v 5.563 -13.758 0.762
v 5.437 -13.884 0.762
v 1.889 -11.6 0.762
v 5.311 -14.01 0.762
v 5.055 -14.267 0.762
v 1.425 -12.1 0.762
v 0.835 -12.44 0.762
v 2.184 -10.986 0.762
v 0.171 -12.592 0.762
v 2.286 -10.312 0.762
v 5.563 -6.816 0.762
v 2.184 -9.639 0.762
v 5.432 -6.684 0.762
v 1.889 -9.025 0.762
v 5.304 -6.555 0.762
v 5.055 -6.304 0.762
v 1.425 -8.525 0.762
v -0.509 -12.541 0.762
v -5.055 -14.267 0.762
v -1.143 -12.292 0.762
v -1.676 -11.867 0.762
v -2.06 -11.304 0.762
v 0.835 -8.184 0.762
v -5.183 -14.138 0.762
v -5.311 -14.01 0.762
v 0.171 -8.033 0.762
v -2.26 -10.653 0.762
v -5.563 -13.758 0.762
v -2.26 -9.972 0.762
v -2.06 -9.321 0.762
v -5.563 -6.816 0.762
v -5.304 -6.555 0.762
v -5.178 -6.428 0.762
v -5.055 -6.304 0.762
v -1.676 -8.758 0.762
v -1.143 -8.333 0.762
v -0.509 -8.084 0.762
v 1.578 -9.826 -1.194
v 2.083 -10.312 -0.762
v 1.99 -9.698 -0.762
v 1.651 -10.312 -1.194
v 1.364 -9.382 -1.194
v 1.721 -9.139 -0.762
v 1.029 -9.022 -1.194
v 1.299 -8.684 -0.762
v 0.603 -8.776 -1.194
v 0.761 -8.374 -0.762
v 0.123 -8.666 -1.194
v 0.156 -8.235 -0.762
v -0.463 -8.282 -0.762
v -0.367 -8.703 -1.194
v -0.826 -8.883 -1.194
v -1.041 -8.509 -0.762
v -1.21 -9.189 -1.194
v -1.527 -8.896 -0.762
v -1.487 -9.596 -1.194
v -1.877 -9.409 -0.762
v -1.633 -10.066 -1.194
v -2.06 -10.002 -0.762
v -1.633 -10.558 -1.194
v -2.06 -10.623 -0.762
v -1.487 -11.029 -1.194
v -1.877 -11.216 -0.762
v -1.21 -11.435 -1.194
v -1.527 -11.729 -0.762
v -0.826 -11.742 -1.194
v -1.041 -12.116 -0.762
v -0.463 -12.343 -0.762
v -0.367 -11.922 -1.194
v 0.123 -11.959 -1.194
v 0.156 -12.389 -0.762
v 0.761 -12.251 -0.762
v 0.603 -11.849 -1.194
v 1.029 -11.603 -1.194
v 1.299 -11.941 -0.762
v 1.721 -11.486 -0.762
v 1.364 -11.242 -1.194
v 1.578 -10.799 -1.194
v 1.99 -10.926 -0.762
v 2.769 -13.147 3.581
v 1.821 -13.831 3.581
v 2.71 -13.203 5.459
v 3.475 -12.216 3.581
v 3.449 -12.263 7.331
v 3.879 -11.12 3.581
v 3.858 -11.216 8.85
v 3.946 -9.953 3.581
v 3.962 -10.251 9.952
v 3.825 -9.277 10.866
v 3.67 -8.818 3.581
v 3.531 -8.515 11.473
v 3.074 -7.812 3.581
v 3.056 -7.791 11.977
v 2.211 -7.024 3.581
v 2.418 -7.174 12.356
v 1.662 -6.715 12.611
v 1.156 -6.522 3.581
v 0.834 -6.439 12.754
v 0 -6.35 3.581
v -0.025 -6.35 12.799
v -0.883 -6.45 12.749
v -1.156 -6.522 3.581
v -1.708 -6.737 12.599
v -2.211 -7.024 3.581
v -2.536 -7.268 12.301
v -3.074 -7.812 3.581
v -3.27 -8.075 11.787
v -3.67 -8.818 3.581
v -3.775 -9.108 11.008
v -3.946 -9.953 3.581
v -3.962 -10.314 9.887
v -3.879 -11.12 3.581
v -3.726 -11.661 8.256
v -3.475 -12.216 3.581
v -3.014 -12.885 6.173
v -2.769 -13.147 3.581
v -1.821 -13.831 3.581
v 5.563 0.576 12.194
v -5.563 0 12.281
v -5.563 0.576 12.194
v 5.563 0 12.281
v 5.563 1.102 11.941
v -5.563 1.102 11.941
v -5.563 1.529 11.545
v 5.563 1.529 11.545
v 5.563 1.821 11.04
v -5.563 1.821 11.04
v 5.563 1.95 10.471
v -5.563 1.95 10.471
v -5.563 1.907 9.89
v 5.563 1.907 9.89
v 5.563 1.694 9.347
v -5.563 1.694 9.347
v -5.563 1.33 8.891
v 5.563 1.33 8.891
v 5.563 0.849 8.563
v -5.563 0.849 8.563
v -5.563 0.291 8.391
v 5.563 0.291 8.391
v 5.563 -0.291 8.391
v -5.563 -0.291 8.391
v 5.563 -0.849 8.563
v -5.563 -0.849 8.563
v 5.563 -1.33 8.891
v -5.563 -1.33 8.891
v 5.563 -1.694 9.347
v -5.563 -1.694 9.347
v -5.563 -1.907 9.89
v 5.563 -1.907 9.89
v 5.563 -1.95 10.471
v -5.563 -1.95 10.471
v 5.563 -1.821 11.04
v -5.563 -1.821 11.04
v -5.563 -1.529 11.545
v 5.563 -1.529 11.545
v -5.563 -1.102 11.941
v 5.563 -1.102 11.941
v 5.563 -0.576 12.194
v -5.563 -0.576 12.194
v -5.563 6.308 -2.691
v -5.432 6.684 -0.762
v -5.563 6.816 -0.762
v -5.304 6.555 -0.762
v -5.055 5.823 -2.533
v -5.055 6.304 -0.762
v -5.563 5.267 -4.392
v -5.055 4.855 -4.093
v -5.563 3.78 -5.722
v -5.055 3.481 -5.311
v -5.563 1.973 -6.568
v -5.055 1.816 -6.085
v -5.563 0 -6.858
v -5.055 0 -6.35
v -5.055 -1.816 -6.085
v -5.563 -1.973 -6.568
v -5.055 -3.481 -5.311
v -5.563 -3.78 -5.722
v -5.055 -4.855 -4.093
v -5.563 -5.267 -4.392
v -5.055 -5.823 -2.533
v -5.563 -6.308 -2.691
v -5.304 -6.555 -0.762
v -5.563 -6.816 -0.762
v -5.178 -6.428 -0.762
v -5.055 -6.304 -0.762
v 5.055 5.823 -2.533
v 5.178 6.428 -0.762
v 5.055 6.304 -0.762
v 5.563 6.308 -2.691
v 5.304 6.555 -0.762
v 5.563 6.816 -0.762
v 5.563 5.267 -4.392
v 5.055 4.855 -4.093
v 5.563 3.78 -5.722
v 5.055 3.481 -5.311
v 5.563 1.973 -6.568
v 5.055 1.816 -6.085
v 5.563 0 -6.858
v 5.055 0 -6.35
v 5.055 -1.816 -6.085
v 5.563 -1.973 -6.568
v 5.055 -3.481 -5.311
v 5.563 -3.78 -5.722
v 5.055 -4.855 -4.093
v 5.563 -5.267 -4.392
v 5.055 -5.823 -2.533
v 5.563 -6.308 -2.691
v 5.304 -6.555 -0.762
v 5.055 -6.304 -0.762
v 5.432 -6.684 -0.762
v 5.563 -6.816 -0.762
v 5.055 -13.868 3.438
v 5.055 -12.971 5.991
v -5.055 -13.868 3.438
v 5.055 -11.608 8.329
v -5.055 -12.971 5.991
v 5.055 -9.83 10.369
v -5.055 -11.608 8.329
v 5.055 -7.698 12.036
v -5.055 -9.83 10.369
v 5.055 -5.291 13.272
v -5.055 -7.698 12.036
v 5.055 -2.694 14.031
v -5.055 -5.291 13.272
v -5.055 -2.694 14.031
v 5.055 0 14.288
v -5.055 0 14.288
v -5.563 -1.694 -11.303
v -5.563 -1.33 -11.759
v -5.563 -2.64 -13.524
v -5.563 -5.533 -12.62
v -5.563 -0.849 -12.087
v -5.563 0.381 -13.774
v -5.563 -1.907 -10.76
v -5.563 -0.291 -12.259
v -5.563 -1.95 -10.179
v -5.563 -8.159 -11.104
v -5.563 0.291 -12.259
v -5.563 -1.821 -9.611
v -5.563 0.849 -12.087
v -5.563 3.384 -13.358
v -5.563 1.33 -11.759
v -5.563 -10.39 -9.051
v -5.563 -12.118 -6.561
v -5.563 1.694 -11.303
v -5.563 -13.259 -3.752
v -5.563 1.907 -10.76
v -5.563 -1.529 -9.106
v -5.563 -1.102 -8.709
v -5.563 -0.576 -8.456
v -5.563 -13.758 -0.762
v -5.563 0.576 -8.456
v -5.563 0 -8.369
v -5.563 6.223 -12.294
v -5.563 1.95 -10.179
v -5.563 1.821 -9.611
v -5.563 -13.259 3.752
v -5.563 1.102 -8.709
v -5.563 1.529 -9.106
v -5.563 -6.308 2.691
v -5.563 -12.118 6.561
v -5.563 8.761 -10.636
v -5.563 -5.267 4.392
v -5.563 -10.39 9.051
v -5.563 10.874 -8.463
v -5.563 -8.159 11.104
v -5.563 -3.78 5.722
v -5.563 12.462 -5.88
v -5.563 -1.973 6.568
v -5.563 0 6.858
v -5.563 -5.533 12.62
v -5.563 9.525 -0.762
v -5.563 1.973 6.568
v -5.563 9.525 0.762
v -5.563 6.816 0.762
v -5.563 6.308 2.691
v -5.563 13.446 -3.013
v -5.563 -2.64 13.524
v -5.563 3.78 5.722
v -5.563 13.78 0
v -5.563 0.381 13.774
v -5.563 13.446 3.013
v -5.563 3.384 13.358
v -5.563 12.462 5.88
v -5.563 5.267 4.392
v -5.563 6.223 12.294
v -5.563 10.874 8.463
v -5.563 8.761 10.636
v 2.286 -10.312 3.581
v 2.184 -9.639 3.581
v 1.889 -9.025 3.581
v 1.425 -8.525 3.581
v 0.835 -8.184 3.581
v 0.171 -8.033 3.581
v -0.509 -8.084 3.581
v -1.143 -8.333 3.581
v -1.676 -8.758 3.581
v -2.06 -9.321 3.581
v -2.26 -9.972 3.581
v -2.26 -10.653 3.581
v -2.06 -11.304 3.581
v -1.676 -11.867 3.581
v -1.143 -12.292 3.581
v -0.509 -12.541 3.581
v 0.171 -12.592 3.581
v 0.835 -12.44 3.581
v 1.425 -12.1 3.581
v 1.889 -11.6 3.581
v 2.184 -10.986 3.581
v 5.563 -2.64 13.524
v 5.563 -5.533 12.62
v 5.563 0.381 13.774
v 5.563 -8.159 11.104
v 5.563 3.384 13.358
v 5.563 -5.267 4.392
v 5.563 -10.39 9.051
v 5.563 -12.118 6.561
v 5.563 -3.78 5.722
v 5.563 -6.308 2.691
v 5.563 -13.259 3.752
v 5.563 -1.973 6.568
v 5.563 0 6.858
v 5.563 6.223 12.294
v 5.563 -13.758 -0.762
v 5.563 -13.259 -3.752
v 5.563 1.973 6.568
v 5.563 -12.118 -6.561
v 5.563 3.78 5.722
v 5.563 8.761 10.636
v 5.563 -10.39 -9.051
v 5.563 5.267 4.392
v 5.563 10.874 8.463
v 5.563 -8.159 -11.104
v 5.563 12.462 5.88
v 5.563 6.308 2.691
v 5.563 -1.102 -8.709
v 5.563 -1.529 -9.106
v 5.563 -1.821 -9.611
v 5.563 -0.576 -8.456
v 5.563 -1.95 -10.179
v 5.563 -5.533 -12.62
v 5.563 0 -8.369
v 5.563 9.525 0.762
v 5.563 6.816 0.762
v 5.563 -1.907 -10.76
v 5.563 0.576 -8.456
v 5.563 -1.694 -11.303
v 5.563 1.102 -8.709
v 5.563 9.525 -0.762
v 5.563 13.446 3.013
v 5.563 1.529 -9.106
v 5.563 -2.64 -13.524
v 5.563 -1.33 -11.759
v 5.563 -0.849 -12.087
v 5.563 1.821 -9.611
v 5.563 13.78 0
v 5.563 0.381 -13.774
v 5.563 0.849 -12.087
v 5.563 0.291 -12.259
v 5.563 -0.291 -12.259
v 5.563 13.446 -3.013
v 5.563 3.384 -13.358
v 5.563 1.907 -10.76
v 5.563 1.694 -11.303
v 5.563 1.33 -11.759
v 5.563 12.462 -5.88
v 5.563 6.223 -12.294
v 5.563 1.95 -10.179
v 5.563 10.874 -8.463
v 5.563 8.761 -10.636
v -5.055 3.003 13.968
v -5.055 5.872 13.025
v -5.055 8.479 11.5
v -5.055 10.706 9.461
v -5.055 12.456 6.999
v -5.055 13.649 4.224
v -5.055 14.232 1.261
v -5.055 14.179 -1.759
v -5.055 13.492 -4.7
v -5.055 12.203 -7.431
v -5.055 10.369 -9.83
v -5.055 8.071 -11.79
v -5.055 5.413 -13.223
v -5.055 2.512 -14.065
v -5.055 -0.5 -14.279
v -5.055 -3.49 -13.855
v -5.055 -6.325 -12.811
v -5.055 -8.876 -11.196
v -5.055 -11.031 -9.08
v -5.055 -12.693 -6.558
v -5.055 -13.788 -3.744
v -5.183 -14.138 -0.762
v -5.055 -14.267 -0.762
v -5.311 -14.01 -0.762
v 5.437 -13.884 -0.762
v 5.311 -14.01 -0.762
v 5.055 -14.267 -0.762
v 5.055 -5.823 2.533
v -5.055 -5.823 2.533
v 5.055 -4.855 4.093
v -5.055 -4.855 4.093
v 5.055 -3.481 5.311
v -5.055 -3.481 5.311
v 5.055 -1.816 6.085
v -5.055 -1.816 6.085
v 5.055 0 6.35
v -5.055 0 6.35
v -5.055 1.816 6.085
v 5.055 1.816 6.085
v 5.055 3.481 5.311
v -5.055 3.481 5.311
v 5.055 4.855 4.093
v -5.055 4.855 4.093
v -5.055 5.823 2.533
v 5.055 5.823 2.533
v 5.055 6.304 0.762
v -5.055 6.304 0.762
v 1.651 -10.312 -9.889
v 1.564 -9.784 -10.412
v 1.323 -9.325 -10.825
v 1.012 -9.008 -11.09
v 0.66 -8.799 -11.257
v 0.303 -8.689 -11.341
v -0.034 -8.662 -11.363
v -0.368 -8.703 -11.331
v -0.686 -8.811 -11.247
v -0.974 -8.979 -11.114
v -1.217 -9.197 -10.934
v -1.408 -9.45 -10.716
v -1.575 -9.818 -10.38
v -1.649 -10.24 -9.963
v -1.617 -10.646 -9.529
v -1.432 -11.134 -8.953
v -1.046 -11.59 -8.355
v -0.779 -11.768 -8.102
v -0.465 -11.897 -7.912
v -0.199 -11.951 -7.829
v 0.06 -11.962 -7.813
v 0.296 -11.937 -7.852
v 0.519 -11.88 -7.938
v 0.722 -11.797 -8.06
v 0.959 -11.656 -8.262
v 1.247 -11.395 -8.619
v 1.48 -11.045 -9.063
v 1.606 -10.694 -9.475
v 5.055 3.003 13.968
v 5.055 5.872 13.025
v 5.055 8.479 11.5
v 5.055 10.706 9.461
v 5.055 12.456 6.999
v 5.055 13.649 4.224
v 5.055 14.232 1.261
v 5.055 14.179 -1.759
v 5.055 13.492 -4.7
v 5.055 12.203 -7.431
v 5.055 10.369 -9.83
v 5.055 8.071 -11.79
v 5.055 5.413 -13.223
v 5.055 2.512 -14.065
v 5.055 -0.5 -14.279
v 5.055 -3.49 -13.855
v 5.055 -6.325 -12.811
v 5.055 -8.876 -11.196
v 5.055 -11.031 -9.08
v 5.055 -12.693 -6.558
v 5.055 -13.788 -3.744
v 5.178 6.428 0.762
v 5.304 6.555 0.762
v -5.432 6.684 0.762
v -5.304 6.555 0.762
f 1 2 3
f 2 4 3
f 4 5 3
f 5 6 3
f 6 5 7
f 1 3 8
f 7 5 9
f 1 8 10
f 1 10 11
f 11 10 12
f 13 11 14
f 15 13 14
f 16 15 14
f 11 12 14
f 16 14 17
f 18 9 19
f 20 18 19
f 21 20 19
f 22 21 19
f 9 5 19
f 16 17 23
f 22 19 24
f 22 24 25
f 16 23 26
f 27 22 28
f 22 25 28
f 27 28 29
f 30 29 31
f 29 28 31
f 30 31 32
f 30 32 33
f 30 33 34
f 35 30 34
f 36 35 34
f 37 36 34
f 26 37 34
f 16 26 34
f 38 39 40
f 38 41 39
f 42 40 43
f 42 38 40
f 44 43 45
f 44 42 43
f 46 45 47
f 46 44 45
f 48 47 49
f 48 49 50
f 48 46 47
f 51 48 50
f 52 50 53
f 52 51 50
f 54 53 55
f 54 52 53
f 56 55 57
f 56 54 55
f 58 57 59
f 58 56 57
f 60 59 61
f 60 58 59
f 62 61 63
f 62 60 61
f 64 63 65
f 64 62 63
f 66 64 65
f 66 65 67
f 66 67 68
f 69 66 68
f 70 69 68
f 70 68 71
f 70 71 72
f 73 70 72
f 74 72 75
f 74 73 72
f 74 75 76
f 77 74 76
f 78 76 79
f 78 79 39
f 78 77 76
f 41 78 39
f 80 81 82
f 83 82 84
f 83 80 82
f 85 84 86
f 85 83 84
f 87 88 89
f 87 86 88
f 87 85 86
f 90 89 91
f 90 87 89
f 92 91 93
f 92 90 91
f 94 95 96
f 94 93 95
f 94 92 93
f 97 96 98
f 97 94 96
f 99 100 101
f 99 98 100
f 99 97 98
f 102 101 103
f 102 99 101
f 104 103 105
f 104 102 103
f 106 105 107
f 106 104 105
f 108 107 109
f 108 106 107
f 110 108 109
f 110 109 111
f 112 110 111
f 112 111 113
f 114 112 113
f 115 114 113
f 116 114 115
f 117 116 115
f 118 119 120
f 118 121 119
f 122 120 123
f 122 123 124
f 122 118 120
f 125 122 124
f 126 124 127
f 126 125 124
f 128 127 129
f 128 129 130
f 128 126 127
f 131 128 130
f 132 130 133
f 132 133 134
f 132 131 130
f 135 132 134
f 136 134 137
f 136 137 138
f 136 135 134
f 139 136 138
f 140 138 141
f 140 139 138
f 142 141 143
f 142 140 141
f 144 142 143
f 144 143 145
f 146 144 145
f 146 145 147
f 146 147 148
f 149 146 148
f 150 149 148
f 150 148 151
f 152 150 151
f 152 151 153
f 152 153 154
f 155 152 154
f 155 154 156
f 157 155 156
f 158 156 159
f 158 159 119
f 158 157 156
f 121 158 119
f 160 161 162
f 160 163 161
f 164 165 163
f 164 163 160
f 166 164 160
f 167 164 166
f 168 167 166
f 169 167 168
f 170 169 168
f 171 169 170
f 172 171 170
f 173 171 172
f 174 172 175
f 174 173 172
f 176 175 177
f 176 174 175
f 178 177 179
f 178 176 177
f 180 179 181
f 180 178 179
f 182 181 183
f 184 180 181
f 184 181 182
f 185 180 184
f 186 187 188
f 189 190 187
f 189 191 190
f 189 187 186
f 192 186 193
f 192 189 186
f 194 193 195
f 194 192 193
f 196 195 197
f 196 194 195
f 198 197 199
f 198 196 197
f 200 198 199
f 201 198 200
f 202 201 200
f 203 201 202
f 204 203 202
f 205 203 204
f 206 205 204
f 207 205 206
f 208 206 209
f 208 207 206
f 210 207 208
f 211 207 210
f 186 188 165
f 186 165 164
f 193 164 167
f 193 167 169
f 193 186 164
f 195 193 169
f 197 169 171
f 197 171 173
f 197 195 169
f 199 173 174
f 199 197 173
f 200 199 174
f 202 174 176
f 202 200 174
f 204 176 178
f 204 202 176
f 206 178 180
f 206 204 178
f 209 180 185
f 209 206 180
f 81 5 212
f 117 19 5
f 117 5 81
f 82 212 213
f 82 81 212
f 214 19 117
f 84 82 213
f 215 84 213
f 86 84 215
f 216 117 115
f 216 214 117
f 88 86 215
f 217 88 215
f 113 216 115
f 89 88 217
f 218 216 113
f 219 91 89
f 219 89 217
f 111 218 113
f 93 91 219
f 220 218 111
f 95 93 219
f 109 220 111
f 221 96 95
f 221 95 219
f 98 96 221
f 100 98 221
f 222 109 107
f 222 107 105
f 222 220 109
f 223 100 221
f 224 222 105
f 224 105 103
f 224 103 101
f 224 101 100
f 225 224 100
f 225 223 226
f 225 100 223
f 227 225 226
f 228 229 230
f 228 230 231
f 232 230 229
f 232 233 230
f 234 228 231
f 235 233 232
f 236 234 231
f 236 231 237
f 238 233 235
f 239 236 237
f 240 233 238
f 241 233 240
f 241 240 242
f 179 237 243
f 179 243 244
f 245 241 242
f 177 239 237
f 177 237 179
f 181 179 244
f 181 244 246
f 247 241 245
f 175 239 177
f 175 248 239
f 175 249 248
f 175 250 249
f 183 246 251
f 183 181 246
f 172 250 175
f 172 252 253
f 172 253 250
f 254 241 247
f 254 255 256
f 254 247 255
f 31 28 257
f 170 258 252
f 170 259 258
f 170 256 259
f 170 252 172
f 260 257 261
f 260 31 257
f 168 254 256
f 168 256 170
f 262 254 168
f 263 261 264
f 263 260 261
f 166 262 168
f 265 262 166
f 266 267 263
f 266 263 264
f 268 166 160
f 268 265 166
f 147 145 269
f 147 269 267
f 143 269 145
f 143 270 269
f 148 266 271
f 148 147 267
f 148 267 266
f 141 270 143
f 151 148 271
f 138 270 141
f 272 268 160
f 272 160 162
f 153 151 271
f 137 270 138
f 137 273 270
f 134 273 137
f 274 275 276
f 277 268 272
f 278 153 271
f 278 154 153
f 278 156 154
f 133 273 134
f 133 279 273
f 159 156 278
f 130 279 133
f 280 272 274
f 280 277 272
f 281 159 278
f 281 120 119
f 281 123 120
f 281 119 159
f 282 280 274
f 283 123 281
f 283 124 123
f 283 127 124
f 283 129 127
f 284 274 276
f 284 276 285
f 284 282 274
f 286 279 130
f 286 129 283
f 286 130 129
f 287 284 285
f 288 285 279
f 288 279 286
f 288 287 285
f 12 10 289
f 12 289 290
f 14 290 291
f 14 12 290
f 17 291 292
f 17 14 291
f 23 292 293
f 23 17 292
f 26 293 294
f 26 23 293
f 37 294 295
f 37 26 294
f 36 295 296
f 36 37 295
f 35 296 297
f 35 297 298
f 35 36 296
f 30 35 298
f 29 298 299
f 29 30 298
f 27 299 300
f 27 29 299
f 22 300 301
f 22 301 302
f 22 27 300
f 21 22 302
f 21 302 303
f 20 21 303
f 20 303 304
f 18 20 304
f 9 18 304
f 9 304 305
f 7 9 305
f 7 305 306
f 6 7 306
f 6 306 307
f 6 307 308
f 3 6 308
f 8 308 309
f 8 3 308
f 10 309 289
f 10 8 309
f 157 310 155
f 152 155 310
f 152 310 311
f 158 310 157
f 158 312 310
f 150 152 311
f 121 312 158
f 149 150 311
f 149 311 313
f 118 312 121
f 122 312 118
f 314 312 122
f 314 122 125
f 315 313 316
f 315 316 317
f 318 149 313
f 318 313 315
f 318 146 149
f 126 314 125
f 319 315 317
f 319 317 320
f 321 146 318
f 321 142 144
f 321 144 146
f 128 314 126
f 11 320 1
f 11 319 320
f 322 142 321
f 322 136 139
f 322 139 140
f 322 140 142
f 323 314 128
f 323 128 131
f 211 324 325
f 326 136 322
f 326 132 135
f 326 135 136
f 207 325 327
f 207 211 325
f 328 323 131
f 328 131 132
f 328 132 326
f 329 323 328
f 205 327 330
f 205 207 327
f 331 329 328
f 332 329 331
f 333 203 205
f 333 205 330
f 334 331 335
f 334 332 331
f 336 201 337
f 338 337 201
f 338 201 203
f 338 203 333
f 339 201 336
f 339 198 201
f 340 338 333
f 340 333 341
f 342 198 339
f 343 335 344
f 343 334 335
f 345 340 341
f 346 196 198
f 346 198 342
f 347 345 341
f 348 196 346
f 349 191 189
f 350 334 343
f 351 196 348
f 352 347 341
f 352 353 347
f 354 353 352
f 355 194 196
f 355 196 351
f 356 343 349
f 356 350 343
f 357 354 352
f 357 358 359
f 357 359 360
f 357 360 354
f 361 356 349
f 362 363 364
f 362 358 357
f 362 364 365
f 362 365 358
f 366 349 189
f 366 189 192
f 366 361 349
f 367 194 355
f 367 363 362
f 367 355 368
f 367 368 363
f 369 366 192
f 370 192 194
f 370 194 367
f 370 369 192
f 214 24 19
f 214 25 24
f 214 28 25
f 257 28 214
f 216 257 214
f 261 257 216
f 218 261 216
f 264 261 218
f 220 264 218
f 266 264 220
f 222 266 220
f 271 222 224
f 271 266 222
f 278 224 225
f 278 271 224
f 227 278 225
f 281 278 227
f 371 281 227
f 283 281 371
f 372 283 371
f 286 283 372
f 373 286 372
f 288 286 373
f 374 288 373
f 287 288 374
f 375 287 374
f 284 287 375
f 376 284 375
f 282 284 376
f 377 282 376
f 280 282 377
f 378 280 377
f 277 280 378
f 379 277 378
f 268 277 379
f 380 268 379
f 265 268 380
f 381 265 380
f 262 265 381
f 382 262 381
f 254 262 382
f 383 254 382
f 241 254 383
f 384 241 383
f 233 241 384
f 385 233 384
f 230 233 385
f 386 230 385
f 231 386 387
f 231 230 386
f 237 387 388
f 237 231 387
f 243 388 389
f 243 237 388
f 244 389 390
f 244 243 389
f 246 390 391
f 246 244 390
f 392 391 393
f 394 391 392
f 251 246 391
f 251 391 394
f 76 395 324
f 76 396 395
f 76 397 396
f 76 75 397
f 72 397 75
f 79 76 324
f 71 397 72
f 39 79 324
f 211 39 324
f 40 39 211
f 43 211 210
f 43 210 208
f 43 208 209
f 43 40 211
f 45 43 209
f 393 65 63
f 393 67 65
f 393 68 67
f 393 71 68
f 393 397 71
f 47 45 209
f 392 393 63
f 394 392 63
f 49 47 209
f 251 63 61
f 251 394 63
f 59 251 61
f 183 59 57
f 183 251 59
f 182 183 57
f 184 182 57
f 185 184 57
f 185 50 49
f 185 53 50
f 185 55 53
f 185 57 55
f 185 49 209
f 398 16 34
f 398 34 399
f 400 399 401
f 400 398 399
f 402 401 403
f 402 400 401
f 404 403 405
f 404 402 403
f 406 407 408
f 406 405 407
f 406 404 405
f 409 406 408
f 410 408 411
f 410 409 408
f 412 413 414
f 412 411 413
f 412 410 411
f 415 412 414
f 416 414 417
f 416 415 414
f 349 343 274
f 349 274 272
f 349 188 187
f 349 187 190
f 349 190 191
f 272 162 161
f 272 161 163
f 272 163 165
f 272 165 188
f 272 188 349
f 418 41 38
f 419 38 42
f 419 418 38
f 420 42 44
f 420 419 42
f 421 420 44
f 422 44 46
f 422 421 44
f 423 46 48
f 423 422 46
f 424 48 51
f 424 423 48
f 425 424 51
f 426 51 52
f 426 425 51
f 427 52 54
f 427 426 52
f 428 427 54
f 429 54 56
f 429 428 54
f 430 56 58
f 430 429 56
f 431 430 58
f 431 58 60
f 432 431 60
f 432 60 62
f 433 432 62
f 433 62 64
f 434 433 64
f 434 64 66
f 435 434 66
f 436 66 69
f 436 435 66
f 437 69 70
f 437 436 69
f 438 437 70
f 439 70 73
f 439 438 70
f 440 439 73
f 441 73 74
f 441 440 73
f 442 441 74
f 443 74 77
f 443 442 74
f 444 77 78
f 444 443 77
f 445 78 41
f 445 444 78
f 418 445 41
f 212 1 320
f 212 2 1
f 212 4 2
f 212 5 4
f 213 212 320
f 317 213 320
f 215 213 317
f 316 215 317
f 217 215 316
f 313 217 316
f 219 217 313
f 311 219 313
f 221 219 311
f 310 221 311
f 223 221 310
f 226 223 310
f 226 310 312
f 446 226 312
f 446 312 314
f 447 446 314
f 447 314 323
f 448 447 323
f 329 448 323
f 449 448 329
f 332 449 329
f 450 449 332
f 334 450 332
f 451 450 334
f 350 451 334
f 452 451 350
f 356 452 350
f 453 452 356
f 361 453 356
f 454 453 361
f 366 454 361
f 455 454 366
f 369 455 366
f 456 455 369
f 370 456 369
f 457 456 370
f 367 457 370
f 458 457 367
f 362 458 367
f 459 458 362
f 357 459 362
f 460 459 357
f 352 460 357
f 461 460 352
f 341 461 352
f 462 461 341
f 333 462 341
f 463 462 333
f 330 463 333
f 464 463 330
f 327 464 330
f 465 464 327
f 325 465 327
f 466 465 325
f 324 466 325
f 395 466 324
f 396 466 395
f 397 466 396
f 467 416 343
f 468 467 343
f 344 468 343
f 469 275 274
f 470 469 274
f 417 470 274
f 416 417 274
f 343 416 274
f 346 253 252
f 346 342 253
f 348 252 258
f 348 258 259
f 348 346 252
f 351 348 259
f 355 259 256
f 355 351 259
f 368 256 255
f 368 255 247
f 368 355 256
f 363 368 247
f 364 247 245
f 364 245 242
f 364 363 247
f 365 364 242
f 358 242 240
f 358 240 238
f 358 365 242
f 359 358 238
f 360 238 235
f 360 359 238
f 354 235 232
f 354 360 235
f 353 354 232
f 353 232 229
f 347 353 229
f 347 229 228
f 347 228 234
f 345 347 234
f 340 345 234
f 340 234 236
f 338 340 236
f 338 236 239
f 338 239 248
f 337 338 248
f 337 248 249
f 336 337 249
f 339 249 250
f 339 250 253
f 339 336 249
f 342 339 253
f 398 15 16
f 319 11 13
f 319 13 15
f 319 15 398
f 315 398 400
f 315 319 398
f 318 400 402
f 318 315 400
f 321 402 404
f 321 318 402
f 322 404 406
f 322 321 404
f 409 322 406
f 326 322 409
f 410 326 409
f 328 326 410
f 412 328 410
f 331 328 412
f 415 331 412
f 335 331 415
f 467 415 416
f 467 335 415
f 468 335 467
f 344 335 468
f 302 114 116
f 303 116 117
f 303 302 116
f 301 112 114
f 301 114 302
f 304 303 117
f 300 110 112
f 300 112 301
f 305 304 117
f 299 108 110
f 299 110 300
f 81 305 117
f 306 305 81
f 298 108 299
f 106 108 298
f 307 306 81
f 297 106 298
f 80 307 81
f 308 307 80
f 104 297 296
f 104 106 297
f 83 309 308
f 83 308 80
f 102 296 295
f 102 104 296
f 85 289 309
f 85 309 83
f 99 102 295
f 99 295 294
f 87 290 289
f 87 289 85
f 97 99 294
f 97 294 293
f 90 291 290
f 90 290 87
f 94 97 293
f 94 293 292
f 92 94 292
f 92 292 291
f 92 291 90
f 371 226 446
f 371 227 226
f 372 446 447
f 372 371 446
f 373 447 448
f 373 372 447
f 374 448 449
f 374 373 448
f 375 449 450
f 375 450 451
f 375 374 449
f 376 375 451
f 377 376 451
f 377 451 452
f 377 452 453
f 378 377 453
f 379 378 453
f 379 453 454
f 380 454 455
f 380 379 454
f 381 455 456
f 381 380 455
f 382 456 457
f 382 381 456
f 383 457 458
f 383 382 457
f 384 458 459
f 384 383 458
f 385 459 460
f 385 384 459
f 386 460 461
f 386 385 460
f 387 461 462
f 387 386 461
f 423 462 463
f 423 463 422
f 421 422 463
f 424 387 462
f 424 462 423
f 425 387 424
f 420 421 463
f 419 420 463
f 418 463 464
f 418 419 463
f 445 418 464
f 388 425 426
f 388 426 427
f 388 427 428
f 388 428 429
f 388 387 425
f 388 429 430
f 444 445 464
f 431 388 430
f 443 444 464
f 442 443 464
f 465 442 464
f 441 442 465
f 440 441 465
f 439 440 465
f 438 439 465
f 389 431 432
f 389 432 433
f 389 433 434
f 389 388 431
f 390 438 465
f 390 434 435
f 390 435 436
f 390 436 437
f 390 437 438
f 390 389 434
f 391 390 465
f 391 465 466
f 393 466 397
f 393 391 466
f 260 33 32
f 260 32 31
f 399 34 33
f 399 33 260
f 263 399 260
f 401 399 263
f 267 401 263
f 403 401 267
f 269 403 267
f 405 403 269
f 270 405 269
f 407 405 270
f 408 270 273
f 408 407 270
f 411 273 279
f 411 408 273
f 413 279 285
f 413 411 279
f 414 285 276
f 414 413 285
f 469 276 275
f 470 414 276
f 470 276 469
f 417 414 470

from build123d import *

# Parameters (mm, degrees)
CUT_EXTRUDE1_DEPTH      = 5.5626
CUT_EXTRUDE1_DEPTH_BACK = 5.5626
SKETCH2_W               = 1.524
SKETCH2_H               = 23.8125
SKETCH5_W               = 11.1252
SKETCH5_H               = 1.9558
SKETCH6_W               = 11.1252
SKETCH6_H               = 1.9558


with BuildPart() as part:
    # Sketch1 → Revolve1 (revolve)
    with BuildSketch(Plane.XY):
        Polygon((-5.5626, 6.858), (-5.0546, 6.35), (5.0546, 6.35), (5.5626, 6.858), (5.5626, 13.7795), (5.0546, 14.2875), (-5.0546, 14.2875), (-5.5626, 13.7795), align=None)
    revolve(axis=Axis((5.5626, 0, 0), (-1, 0, 0)))

    # Sketch2 → Cut-Extrude1 (cut, two sides: drawn at the far end of the back side and taken through both)
    with BuildSketch(Plane(origin=(0, 0, 0), x_dir=(0, 0, -1), z_dir=(1, 0, 0)).offset(-CUT_EXTRUDE1_DEPTH_BACK)):
        with Locations((0, -2.38125)):
            Rectangle(SKETCH2_W, SKETCH2_H)
    extrude(amount=CUT_EXTRUDE1_DEPTH + CUT_EXTRUDE1_DEPTH_BACK, mode=Mode.SUBTRACT)

    # Sketch3 → Cut-Revolve1 (revolve, cut)
    with BuildSketch(Plane(origin=(0, 0, 0), x_dir=(0, 0, -1), z_dir=(1, 0, 0))):
        Polygon((-14.2875, -10.3124), (-14.2875, -6.35), (-3.5814, -6.35), (-3.5814, -8.0264), (0, -8.0264), (0, -10.3124), align=None)
    revolve(axis=Axis((0, -10.3124, 0), (0, 0, 1)), mode=Mode.SUBTRACT)

    # Sketch4 → Cut-Revolve2 (revolve, cut)
    with BuildSketch(Plane(origin=(0, 0, 0), x_dir=(0, 0, -1), z_dir=(1, 0, 0))):
        Polygon((0.762, -10.3124), (0.762, -8.2296), (1.1938, -8.6614), (16.2306, -8.6614), (16.2306, -10.3124), align=None)
    revolve(axis=Axis((0, -10.3124, -16.2306), (0, 0, 1)), mode=Mode.SUBTRACT)

    # Sketch5 → Cut-Revolve3 (revolve, cut)
    with BuildSketch(Plane(origin=(0, 0, 0), x_dir=(1, 0, 0), z_dir=(0, 1, 0))):
        with Locations((0, 11.303)):
            Rectangle(SKETCH5_W, SKETCH5_H)
    revolve(axis=Axis((5.5626, 0, -10.3251), (-1, 0, 0)), mode=Mode.SUBTRACT)

    # Sketch6 → Cut-Revolve4 (revolve, cut)
    with BuildSketch(Plane(origin=(0, 0, 0), x_dir=(1, 0, 0), z_dir=(0, 1, 0))):
        with Locations((0, -9.3472)):
            Rectangle(SKETCH6_W, SKETCH6_H)
    revolve(axis=Axis((5.5626, 0, 10.3251), (-1, 0, 0)), mode=Mode.SUBTRACT)


solid = part.part
